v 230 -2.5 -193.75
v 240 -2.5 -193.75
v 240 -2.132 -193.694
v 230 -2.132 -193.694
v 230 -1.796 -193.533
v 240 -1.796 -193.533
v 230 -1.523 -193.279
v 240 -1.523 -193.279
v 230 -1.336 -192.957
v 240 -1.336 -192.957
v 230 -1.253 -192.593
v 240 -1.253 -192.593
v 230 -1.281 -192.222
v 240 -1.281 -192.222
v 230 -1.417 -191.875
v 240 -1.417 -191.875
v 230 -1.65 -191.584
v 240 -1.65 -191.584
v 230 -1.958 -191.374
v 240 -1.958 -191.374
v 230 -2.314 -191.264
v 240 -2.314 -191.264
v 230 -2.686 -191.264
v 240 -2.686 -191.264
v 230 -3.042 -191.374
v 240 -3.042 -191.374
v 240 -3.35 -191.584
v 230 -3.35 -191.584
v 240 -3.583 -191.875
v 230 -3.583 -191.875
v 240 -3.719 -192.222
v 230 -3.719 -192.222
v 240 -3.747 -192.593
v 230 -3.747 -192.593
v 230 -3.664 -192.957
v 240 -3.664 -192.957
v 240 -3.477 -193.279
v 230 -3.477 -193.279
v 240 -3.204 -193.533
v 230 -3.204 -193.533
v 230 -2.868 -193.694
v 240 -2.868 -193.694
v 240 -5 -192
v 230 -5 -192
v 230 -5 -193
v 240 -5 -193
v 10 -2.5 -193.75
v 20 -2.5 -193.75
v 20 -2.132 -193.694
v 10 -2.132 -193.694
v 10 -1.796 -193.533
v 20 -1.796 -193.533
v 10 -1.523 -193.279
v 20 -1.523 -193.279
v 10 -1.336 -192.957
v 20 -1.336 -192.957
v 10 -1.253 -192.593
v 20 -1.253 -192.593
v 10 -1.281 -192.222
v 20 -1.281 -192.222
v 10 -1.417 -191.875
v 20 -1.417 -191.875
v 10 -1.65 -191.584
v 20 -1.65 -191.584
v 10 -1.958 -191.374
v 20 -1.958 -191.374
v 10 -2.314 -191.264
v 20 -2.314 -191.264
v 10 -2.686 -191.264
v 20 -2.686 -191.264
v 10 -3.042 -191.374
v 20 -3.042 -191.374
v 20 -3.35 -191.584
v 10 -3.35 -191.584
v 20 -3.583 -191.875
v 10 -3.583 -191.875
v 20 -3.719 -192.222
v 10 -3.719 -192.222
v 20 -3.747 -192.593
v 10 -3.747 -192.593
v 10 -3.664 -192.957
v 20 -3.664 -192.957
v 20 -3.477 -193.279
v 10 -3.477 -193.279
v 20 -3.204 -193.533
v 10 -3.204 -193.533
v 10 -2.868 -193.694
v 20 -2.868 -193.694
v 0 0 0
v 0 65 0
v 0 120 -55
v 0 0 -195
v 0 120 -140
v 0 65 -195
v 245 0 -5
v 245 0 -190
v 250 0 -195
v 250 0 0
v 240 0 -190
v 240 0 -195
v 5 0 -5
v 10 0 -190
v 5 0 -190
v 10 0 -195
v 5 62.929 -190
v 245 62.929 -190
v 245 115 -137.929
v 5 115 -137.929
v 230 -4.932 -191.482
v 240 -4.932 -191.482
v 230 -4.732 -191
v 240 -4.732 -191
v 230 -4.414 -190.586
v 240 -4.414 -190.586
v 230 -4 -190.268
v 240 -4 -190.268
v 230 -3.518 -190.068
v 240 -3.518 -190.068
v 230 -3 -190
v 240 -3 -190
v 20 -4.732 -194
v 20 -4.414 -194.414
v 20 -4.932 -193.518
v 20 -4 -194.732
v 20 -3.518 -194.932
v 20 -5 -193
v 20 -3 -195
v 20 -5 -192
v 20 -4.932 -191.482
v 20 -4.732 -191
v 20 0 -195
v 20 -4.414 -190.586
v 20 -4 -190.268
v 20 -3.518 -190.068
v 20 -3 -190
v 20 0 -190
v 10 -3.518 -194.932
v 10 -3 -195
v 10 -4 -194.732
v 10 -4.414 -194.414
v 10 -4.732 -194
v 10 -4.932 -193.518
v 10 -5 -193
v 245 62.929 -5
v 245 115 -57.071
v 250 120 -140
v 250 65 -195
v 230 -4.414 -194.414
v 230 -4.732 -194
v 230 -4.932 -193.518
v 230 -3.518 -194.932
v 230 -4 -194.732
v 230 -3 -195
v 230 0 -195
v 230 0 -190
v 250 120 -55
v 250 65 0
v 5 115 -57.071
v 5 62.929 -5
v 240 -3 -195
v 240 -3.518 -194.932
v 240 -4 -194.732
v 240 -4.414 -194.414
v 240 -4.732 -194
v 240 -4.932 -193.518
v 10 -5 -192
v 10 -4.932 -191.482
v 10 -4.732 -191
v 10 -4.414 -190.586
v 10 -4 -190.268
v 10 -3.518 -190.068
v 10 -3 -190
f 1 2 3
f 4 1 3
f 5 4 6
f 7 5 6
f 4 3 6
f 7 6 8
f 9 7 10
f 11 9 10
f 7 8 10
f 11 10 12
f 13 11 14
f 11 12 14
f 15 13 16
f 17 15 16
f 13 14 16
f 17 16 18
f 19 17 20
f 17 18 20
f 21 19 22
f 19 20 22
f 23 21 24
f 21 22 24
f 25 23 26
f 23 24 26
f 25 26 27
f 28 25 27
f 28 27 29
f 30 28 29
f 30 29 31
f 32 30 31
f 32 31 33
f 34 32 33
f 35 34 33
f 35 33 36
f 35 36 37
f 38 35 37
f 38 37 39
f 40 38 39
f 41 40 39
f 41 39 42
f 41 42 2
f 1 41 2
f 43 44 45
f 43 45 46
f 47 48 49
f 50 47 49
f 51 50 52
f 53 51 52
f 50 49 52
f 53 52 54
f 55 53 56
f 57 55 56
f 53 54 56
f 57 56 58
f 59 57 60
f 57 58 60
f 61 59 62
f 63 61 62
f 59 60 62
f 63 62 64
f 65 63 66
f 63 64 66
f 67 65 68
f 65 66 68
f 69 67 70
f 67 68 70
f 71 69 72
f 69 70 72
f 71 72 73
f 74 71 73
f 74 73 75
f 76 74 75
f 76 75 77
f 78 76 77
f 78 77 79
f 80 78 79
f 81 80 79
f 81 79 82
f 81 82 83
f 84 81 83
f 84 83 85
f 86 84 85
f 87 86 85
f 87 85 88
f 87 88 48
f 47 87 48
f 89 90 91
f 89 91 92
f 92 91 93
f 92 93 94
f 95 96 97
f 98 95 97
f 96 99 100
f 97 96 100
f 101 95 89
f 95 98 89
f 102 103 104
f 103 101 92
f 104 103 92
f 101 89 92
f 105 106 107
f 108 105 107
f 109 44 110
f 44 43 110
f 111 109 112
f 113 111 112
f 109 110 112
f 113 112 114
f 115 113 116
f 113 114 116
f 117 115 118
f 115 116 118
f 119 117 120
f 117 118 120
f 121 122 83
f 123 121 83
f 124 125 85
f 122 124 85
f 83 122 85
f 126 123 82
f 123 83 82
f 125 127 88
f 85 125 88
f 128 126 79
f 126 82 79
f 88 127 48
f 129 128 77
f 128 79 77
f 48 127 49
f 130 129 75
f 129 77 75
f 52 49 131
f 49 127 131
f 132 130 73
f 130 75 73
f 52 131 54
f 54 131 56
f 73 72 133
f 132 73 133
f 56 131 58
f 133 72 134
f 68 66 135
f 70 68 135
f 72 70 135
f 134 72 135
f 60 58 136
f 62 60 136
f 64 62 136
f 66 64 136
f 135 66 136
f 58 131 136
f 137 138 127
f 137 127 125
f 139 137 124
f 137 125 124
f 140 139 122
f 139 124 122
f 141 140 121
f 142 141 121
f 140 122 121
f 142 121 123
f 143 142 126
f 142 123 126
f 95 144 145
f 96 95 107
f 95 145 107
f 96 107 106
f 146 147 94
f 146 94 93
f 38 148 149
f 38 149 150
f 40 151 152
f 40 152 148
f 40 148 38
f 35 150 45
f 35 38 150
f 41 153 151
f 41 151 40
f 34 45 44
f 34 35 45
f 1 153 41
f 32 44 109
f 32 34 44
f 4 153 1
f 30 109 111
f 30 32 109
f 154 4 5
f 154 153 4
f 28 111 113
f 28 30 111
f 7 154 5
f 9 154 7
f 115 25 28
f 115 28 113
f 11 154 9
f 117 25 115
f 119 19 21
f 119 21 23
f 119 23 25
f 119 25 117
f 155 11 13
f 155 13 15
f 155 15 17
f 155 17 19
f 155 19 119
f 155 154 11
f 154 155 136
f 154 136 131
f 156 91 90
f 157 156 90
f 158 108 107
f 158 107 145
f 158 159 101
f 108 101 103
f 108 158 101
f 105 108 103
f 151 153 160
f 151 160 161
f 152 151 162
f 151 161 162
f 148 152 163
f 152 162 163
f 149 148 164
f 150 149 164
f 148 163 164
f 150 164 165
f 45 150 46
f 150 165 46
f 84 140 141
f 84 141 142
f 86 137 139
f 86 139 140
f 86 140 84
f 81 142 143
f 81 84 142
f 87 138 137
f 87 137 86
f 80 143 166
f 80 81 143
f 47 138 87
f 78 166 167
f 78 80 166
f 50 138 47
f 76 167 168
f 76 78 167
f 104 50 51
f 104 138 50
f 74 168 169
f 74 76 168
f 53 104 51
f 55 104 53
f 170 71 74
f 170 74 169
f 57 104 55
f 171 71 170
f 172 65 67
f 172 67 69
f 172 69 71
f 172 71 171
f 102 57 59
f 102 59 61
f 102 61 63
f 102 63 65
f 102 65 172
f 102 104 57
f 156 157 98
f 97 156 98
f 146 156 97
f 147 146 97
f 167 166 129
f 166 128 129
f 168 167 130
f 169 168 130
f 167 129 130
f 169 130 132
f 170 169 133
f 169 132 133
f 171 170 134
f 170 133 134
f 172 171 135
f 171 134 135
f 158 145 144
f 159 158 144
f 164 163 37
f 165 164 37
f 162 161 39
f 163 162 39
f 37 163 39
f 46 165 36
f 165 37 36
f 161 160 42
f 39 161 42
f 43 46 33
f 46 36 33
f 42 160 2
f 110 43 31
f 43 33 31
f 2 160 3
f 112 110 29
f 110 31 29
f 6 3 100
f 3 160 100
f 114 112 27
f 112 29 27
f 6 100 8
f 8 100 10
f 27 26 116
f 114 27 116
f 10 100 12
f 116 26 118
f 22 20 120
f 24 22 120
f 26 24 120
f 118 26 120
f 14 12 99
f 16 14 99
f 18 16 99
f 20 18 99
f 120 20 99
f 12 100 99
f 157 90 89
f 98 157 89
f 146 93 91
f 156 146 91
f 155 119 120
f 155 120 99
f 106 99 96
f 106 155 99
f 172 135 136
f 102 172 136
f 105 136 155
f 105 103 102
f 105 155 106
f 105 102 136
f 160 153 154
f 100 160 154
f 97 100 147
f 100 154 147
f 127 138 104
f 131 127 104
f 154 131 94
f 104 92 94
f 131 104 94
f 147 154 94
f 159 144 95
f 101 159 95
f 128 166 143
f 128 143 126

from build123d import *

# Parameters (mm, degrees)
BOSS_EXTRUDE1_DEPTH = 250
SHELL1_T            = -5
SKETCH4_W           = 10
SKETCH4_H           = 5
BOSS_EXTRUDE3_DEPTH = 5
SKETCH5_R           = 1.25
CUT_EXTRUDE3_DEPTH  = 241
FILLET2_R           = 2


with BuildPart() as part:
    # Sketch1 → Boss-Extrude1 (new body)
    with BuildSketch(Plane(origin=(0, 0, 0), x_dir=(0, 0, -1), z_dir=(1, 0, 0))):
        Polygon((0, 0), (195, 0), (195, 65), (140, 120), (55, 120), (0, 65), align=None)
    extrude(amount=BOSS_EXTRUDE1_DEPTH)

    # Shell1
    shell1_openings = [part.faces().sort_by_distance(p)[0] for p in [
        (125, 0, -97.5),
    ]]
    offset(amount=SHELL1_T, openings=shell1_openings, kind=Kind.INTERSECTION)

    # Sketch4 → Boss-Extrude3 (add)
    with BuildSketch(Plane.XZ):
        with Locations((15, -192.5)):
            Rectangle(SKETCH4_W, SKETCH4_H)
        with Locations((235, -192.5)):
            Rectangle(SKETCH4_W, SKETCH4_H)
    extrude(amount=BOSS_EXTRUDE3_DEPTH)

    # Sketch5 → Cut-Extrude3 (cut, through all)
    with BuildSketch(Plane(origin=(240, 0, 0), x_dir=(0, 0, -1), z_dir=(1, 0, 0))):
        with Locations((192.5, -2.5)):
            Circle(SKETCH5_R)
    extrude(amount=-CUT_EXTRUDE3_DEPTH, mode=Mode.SUBTRACT)

    # Fillet2
    fillet2_edges = [part.edges().sort_by_distance(p)[0] for p in [
        (235, -5, -195),
        (235, -5, -190),
        (15, -5, -190),
        (15, -5, -195),
    ]]
    fillet(fillet2_edges, radius=FILLET2_R)


solid = part.part
